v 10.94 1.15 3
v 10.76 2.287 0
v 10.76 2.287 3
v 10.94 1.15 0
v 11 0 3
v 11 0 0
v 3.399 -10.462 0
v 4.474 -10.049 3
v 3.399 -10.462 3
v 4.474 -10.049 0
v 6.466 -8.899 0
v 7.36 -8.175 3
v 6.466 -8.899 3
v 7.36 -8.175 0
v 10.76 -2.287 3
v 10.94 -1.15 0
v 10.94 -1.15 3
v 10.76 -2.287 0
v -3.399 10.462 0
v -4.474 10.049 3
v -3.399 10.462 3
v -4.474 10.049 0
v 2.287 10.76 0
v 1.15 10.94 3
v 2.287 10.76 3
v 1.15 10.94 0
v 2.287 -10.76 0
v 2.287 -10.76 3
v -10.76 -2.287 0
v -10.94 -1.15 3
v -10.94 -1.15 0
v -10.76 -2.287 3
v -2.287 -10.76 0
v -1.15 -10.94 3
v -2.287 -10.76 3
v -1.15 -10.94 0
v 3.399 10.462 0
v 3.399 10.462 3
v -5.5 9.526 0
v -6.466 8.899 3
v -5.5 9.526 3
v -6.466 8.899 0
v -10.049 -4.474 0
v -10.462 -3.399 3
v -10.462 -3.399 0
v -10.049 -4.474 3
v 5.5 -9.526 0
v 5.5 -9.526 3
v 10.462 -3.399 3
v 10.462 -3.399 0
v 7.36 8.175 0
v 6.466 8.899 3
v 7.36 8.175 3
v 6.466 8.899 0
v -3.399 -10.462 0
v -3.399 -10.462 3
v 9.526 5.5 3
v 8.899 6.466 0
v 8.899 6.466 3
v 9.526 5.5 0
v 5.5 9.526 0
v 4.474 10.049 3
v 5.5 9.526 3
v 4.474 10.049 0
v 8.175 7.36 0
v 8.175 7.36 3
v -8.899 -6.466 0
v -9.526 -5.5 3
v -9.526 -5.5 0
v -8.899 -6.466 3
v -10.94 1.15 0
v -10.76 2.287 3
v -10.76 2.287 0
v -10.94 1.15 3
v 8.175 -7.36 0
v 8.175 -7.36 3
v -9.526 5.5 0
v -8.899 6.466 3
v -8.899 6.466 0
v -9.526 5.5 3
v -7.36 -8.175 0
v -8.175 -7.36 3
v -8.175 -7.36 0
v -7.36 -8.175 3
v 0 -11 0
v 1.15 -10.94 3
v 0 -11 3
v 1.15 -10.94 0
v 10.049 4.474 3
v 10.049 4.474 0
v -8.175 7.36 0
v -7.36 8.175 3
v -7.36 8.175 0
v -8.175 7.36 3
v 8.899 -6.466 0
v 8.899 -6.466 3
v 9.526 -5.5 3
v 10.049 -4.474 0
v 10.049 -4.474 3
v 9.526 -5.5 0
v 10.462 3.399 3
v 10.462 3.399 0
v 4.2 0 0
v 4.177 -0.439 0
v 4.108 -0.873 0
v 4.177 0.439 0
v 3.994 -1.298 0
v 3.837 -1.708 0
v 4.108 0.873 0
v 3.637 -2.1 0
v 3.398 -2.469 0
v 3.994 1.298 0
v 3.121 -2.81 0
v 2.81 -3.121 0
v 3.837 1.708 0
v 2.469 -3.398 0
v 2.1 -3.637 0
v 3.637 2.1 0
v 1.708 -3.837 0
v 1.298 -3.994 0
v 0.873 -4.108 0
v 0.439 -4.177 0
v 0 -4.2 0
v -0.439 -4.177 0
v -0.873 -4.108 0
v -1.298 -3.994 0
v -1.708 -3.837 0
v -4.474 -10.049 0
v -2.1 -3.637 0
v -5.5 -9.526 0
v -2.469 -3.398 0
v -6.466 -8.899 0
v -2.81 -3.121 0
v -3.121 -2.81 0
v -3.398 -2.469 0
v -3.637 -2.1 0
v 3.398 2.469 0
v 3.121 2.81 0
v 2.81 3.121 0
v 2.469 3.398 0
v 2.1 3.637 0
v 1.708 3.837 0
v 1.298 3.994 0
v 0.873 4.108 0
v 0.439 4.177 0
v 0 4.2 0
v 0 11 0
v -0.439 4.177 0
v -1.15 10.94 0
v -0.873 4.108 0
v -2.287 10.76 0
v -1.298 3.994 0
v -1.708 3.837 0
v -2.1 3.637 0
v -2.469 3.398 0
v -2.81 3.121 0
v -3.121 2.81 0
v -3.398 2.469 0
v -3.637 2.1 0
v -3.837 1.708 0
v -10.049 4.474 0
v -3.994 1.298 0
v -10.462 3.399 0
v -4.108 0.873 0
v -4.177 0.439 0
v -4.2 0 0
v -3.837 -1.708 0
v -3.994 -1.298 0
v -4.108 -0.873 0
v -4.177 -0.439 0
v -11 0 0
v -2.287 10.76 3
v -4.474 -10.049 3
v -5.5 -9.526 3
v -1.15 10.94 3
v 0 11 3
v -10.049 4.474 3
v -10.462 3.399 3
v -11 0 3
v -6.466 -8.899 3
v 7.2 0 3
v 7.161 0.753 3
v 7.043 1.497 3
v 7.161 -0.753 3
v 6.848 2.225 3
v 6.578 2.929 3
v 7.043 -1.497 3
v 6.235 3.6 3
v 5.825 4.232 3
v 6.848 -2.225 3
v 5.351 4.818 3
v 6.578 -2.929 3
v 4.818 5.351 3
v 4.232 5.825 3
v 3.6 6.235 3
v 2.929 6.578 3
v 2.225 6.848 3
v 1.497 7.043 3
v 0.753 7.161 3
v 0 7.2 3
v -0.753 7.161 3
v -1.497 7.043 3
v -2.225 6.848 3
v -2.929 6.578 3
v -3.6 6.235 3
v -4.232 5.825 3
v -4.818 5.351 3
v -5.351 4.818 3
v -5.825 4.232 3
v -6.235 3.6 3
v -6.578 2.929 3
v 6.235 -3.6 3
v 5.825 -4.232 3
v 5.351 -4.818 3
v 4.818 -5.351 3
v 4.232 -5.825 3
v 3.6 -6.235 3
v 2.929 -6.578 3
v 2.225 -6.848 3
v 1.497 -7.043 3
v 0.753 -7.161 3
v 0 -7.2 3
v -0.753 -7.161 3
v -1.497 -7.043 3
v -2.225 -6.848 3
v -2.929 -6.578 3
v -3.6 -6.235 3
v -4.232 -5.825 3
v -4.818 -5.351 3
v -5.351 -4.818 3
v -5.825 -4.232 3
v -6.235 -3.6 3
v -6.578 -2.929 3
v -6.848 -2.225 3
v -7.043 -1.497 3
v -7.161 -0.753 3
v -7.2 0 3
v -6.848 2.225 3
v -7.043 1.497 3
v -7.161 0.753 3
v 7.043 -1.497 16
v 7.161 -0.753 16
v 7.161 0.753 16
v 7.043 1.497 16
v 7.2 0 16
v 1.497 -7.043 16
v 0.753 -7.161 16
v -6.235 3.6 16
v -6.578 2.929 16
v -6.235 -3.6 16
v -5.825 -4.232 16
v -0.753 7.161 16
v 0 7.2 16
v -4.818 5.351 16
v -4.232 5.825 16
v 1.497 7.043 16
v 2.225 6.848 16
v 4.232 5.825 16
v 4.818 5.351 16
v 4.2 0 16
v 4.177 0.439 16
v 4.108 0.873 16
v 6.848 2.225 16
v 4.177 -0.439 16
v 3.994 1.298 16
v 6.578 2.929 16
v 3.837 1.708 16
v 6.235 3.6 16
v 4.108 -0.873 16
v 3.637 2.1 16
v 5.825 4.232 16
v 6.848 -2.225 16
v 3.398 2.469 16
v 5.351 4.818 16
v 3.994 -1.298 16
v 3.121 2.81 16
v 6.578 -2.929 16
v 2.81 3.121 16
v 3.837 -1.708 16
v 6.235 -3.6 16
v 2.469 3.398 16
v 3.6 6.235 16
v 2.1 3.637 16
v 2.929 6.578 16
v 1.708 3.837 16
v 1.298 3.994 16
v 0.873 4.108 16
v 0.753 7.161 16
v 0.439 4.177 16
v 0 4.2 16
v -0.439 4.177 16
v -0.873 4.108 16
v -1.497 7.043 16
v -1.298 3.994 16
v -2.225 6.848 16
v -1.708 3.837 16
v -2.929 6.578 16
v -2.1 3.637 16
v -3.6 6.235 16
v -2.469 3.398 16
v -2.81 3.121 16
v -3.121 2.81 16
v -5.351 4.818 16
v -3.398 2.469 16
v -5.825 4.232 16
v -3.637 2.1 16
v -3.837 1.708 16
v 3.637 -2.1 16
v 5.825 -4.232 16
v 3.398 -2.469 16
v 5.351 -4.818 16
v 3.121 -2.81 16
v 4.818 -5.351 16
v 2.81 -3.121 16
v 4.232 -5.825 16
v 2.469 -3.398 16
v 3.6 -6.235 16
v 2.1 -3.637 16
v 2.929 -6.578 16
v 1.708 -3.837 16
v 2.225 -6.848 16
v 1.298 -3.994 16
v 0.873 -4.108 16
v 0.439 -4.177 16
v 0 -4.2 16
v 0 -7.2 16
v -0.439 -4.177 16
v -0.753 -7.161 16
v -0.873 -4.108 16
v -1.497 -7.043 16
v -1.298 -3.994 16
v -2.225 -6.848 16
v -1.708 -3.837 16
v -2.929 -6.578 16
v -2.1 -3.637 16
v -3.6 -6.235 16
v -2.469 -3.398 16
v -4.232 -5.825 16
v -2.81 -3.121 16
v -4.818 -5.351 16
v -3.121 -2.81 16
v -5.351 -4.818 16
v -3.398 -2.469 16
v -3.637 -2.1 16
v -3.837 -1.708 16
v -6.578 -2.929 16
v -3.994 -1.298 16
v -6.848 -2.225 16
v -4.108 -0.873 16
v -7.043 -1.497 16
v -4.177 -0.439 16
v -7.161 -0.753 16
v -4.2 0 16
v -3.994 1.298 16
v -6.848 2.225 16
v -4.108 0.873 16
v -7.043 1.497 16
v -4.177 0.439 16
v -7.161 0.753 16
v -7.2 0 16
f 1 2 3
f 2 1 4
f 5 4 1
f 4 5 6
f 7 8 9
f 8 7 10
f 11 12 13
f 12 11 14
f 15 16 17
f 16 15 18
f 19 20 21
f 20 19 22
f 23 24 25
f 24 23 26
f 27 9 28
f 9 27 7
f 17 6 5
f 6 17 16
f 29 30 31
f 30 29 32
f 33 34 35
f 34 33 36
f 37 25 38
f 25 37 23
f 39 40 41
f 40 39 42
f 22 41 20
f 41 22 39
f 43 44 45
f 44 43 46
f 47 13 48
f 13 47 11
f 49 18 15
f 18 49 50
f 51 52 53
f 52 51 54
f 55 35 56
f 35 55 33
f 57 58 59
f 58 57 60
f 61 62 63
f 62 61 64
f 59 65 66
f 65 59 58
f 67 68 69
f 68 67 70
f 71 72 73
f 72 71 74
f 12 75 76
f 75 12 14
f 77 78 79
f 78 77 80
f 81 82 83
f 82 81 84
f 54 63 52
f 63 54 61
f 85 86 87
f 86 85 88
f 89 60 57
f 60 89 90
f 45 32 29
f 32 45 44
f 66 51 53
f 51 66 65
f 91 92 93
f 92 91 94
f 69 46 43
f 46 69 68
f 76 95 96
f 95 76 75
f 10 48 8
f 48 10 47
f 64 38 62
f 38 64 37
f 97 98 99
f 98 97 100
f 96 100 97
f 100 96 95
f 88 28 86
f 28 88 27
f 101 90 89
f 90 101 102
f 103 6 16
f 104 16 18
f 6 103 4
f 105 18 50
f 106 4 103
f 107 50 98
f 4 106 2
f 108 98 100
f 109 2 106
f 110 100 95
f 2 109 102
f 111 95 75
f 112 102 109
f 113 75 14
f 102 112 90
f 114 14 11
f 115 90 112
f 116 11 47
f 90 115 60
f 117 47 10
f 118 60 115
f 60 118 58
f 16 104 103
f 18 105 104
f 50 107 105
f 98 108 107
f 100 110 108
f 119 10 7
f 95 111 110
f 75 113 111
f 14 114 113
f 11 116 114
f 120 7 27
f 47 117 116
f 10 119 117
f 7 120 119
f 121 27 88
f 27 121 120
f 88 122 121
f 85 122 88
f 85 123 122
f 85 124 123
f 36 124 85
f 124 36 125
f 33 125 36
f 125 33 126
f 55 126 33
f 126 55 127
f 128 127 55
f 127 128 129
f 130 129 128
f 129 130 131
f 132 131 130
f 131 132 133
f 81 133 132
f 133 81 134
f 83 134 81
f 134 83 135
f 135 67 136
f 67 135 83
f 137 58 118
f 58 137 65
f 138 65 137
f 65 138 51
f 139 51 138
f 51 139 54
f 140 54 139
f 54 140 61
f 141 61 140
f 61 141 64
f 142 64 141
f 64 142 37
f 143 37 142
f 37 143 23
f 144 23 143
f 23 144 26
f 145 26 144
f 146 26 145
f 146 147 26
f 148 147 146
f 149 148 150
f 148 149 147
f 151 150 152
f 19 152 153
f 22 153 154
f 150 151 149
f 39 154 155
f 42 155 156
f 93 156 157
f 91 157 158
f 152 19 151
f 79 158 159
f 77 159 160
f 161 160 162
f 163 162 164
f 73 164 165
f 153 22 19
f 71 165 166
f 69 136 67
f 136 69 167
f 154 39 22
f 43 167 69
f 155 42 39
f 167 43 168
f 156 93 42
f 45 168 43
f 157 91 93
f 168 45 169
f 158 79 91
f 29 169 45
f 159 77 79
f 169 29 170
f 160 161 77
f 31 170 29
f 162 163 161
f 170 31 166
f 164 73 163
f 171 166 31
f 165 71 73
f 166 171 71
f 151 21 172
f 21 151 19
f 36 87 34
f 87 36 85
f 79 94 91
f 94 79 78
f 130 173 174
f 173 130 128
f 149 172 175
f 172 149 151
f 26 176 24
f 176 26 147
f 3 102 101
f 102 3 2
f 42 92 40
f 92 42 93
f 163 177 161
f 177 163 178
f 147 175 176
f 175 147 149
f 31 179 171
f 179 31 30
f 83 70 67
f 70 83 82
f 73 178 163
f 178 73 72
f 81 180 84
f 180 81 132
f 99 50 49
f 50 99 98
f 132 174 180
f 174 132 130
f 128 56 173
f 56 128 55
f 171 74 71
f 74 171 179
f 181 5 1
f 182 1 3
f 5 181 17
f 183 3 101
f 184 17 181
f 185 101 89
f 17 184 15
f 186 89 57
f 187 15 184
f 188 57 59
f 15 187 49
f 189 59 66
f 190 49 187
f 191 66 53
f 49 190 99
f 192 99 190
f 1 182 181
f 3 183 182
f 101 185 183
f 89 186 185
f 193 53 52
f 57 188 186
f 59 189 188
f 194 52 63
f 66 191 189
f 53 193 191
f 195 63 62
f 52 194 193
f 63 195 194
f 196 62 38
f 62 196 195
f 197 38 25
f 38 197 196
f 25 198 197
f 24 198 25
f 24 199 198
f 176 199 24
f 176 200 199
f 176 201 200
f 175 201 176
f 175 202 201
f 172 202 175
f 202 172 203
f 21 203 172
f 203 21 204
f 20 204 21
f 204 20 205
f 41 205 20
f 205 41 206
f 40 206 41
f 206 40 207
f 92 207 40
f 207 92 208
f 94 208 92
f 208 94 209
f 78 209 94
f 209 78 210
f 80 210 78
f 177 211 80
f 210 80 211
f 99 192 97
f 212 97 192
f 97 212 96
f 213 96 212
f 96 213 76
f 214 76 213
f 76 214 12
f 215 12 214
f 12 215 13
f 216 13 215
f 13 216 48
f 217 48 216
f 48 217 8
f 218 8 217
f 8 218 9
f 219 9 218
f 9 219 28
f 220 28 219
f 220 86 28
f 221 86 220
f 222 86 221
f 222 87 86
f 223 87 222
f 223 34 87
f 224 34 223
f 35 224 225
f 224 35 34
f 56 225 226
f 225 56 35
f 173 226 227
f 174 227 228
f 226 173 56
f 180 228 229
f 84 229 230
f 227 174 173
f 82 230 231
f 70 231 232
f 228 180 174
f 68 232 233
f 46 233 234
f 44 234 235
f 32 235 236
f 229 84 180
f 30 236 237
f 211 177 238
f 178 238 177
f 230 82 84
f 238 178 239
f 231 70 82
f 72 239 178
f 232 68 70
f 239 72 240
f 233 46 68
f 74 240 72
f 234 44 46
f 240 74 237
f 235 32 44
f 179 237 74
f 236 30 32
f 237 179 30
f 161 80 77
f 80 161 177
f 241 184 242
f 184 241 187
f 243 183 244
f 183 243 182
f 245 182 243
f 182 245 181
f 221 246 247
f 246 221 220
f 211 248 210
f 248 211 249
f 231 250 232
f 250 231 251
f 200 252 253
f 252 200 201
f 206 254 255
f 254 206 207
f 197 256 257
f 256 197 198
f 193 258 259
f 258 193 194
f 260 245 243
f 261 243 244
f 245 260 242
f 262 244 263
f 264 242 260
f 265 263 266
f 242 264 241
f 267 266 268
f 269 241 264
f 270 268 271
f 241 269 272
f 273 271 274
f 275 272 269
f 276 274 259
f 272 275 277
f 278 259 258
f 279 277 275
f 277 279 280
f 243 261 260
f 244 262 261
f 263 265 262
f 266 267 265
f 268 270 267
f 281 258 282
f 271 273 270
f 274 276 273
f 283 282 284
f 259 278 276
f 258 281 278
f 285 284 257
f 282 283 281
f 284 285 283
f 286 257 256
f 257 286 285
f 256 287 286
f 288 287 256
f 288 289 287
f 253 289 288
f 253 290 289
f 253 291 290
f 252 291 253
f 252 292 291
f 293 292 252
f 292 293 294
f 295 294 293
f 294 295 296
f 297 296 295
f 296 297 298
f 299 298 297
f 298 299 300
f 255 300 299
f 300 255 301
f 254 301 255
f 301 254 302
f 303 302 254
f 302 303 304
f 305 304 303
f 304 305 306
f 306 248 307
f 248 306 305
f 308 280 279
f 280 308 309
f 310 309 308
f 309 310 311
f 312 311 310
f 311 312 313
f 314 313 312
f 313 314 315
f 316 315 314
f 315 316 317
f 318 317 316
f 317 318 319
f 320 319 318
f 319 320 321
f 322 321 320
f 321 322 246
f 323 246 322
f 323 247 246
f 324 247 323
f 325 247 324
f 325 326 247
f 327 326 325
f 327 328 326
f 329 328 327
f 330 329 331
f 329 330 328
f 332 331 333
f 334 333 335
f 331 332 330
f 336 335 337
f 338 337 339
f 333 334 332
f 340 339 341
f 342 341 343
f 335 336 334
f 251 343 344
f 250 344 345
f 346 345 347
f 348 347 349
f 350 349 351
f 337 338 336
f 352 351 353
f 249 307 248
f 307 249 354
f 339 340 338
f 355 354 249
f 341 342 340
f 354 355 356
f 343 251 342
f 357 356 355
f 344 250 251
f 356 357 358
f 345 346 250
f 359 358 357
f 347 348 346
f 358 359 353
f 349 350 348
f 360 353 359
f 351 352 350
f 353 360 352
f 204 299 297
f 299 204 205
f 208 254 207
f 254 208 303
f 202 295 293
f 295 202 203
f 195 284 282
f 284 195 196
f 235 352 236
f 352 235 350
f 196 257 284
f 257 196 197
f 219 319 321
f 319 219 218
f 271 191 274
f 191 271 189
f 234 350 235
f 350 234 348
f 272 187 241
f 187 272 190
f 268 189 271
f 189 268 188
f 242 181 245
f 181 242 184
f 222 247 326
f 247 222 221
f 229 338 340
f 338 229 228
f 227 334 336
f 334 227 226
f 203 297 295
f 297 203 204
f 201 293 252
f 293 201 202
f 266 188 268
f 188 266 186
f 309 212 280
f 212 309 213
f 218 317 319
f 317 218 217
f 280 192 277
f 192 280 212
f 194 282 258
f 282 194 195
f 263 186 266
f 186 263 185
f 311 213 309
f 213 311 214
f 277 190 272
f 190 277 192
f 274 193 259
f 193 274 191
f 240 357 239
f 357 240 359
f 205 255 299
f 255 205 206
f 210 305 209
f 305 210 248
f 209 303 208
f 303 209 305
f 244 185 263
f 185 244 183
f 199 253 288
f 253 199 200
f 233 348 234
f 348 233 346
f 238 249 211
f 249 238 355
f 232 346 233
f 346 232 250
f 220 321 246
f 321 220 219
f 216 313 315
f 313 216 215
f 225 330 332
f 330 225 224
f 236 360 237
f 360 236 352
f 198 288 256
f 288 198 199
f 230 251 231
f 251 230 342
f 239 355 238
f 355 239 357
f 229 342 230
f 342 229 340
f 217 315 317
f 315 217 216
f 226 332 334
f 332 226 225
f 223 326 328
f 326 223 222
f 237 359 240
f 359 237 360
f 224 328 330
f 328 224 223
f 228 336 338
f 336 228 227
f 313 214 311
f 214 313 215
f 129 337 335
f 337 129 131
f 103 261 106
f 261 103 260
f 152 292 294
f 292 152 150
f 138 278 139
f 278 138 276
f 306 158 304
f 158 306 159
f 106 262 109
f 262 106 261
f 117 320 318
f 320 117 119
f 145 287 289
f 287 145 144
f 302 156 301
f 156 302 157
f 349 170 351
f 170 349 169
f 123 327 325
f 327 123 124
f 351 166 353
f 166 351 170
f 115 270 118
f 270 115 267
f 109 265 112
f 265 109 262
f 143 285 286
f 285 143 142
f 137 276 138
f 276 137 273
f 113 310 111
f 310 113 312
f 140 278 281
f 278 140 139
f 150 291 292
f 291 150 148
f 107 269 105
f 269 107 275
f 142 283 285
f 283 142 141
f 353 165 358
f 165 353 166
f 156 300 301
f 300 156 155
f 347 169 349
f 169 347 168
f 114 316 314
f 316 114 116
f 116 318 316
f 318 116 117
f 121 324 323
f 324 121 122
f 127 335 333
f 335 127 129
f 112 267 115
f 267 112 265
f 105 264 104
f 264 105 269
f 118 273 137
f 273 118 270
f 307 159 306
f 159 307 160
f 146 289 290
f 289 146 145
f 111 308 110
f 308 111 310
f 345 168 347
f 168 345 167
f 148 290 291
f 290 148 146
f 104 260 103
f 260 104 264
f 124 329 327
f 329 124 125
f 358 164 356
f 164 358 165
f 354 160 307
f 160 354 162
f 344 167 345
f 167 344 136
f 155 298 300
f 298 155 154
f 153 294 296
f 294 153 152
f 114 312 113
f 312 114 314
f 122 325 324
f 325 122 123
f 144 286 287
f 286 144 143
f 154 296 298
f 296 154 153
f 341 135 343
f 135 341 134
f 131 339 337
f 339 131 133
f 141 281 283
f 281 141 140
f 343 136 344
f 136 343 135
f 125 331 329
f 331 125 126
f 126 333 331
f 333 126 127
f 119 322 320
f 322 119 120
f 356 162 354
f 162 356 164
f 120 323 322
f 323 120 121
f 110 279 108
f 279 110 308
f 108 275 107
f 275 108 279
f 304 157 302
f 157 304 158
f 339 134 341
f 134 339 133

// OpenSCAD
// Threaded mounting boss.
$fn = 60;
eps = 0.02;
thread_d = 8.4;
base_d = 22;
height = 16;
difference() { union() { cylinder(d=base_d,h=3); cylinder(d=thread_d+6,h=height); } translate([0,0,-eps]) cylinder(d=thread_d,h=height+2*eps); }
